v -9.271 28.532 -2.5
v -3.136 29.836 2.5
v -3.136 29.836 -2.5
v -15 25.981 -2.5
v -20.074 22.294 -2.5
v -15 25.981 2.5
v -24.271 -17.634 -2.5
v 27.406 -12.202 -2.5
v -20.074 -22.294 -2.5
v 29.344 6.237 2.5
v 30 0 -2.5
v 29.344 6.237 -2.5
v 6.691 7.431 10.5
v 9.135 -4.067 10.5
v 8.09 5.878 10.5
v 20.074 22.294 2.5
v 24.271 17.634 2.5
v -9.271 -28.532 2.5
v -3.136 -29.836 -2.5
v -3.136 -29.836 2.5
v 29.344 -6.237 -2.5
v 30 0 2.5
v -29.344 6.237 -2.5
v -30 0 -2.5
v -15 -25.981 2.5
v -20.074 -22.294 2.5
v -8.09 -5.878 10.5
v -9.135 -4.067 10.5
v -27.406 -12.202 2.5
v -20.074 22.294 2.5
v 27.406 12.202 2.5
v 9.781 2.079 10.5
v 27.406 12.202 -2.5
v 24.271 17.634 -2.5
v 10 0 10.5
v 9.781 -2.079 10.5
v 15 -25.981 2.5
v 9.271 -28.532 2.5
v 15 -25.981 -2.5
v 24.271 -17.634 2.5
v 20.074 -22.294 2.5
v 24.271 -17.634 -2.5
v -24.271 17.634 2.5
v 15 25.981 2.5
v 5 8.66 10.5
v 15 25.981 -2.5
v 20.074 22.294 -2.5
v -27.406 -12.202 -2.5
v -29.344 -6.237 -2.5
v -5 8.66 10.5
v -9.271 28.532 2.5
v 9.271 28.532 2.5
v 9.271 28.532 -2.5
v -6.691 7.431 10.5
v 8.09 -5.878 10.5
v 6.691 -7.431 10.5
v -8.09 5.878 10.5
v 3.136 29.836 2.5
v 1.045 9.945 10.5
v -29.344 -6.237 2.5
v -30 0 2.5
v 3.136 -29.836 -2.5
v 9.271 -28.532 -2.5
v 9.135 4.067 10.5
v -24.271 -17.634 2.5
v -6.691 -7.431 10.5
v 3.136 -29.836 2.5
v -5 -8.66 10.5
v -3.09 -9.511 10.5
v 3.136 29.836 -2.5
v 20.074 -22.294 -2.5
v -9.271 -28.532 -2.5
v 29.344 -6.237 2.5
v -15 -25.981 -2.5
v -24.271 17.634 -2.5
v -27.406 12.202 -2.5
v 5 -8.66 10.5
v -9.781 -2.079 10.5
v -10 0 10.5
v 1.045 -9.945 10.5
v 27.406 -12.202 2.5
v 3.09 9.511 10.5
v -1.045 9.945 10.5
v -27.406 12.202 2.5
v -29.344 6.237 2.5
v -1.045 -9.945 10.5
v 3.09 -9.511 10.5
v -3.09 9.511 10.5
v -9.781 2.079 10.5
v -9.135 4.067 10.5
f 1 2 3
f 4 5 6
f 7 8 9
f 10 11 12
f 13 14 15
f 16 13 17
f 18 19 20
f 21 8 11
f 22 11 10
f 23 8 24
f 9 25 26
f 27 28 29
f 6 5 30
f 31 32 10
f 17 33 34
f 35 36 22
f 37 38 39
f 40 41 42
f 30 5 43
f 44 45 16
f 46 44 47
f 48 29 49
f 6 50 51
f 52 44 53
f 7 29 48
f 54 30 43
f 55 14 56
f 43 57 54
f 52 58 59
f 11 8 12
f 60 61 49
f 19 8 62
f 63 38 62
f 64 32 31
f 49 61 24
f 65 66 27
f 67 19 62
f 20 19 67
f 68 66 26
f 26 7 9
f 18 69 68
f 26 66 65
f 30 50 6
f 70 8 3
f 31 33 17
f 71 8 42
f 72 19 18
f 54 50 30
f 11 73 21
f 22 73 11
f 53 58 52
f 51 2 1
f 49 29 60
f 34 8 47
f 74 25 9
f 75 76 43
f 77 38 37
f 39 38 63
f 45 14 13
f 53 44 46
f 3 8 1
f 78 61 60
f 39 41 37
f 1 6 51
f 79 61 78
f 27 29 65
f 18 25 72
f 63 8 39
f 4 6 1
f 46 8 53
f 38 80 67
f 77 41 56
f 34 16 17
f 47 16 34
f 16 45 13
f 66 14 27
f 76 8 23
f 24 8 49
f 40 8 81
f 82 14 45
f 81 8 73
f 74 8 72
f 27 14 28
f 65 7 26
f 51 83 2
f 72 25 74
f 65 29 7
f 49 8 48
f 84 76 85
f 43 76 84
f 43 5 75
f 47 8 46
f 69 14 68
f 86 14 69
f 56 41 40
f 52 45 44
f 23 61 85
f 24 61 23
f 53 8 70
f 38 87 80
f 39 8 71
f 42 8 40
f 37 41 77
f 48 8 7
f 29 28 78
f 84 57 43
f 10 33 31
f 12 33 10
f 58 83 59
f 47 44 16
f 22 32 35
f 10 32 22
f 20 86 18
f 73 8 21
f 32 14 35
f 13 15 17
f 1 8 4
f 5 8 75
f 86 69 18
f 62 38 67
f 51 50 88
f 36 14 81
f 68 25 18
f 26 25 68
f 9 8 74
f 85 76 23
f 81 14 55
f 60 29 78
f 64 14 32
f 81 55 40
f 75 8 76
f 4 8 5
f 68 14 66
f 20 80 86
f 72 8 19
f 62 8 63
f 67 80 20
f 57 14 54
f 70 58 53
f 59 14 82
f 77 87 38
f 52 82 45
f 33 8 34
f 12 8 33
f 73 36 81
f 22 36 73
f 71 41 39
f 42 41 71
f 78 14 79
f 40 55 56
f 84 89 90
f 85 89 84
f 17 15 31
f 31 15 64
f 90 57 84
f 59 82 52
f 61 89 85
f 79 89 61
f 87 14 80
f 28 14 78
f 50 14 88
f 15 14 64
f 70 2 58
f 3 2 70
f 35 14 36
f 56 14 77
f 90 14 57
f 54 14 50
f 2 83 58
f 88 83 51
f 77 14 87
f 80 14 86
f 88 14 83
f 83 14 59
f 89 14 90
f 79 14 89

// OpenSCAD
hull () {
  cylinder (h=5, r=30, center=true);
  translate ([0, 0, 10]) {
    cylinder (h=1, r=10, center=true);
  }
}
